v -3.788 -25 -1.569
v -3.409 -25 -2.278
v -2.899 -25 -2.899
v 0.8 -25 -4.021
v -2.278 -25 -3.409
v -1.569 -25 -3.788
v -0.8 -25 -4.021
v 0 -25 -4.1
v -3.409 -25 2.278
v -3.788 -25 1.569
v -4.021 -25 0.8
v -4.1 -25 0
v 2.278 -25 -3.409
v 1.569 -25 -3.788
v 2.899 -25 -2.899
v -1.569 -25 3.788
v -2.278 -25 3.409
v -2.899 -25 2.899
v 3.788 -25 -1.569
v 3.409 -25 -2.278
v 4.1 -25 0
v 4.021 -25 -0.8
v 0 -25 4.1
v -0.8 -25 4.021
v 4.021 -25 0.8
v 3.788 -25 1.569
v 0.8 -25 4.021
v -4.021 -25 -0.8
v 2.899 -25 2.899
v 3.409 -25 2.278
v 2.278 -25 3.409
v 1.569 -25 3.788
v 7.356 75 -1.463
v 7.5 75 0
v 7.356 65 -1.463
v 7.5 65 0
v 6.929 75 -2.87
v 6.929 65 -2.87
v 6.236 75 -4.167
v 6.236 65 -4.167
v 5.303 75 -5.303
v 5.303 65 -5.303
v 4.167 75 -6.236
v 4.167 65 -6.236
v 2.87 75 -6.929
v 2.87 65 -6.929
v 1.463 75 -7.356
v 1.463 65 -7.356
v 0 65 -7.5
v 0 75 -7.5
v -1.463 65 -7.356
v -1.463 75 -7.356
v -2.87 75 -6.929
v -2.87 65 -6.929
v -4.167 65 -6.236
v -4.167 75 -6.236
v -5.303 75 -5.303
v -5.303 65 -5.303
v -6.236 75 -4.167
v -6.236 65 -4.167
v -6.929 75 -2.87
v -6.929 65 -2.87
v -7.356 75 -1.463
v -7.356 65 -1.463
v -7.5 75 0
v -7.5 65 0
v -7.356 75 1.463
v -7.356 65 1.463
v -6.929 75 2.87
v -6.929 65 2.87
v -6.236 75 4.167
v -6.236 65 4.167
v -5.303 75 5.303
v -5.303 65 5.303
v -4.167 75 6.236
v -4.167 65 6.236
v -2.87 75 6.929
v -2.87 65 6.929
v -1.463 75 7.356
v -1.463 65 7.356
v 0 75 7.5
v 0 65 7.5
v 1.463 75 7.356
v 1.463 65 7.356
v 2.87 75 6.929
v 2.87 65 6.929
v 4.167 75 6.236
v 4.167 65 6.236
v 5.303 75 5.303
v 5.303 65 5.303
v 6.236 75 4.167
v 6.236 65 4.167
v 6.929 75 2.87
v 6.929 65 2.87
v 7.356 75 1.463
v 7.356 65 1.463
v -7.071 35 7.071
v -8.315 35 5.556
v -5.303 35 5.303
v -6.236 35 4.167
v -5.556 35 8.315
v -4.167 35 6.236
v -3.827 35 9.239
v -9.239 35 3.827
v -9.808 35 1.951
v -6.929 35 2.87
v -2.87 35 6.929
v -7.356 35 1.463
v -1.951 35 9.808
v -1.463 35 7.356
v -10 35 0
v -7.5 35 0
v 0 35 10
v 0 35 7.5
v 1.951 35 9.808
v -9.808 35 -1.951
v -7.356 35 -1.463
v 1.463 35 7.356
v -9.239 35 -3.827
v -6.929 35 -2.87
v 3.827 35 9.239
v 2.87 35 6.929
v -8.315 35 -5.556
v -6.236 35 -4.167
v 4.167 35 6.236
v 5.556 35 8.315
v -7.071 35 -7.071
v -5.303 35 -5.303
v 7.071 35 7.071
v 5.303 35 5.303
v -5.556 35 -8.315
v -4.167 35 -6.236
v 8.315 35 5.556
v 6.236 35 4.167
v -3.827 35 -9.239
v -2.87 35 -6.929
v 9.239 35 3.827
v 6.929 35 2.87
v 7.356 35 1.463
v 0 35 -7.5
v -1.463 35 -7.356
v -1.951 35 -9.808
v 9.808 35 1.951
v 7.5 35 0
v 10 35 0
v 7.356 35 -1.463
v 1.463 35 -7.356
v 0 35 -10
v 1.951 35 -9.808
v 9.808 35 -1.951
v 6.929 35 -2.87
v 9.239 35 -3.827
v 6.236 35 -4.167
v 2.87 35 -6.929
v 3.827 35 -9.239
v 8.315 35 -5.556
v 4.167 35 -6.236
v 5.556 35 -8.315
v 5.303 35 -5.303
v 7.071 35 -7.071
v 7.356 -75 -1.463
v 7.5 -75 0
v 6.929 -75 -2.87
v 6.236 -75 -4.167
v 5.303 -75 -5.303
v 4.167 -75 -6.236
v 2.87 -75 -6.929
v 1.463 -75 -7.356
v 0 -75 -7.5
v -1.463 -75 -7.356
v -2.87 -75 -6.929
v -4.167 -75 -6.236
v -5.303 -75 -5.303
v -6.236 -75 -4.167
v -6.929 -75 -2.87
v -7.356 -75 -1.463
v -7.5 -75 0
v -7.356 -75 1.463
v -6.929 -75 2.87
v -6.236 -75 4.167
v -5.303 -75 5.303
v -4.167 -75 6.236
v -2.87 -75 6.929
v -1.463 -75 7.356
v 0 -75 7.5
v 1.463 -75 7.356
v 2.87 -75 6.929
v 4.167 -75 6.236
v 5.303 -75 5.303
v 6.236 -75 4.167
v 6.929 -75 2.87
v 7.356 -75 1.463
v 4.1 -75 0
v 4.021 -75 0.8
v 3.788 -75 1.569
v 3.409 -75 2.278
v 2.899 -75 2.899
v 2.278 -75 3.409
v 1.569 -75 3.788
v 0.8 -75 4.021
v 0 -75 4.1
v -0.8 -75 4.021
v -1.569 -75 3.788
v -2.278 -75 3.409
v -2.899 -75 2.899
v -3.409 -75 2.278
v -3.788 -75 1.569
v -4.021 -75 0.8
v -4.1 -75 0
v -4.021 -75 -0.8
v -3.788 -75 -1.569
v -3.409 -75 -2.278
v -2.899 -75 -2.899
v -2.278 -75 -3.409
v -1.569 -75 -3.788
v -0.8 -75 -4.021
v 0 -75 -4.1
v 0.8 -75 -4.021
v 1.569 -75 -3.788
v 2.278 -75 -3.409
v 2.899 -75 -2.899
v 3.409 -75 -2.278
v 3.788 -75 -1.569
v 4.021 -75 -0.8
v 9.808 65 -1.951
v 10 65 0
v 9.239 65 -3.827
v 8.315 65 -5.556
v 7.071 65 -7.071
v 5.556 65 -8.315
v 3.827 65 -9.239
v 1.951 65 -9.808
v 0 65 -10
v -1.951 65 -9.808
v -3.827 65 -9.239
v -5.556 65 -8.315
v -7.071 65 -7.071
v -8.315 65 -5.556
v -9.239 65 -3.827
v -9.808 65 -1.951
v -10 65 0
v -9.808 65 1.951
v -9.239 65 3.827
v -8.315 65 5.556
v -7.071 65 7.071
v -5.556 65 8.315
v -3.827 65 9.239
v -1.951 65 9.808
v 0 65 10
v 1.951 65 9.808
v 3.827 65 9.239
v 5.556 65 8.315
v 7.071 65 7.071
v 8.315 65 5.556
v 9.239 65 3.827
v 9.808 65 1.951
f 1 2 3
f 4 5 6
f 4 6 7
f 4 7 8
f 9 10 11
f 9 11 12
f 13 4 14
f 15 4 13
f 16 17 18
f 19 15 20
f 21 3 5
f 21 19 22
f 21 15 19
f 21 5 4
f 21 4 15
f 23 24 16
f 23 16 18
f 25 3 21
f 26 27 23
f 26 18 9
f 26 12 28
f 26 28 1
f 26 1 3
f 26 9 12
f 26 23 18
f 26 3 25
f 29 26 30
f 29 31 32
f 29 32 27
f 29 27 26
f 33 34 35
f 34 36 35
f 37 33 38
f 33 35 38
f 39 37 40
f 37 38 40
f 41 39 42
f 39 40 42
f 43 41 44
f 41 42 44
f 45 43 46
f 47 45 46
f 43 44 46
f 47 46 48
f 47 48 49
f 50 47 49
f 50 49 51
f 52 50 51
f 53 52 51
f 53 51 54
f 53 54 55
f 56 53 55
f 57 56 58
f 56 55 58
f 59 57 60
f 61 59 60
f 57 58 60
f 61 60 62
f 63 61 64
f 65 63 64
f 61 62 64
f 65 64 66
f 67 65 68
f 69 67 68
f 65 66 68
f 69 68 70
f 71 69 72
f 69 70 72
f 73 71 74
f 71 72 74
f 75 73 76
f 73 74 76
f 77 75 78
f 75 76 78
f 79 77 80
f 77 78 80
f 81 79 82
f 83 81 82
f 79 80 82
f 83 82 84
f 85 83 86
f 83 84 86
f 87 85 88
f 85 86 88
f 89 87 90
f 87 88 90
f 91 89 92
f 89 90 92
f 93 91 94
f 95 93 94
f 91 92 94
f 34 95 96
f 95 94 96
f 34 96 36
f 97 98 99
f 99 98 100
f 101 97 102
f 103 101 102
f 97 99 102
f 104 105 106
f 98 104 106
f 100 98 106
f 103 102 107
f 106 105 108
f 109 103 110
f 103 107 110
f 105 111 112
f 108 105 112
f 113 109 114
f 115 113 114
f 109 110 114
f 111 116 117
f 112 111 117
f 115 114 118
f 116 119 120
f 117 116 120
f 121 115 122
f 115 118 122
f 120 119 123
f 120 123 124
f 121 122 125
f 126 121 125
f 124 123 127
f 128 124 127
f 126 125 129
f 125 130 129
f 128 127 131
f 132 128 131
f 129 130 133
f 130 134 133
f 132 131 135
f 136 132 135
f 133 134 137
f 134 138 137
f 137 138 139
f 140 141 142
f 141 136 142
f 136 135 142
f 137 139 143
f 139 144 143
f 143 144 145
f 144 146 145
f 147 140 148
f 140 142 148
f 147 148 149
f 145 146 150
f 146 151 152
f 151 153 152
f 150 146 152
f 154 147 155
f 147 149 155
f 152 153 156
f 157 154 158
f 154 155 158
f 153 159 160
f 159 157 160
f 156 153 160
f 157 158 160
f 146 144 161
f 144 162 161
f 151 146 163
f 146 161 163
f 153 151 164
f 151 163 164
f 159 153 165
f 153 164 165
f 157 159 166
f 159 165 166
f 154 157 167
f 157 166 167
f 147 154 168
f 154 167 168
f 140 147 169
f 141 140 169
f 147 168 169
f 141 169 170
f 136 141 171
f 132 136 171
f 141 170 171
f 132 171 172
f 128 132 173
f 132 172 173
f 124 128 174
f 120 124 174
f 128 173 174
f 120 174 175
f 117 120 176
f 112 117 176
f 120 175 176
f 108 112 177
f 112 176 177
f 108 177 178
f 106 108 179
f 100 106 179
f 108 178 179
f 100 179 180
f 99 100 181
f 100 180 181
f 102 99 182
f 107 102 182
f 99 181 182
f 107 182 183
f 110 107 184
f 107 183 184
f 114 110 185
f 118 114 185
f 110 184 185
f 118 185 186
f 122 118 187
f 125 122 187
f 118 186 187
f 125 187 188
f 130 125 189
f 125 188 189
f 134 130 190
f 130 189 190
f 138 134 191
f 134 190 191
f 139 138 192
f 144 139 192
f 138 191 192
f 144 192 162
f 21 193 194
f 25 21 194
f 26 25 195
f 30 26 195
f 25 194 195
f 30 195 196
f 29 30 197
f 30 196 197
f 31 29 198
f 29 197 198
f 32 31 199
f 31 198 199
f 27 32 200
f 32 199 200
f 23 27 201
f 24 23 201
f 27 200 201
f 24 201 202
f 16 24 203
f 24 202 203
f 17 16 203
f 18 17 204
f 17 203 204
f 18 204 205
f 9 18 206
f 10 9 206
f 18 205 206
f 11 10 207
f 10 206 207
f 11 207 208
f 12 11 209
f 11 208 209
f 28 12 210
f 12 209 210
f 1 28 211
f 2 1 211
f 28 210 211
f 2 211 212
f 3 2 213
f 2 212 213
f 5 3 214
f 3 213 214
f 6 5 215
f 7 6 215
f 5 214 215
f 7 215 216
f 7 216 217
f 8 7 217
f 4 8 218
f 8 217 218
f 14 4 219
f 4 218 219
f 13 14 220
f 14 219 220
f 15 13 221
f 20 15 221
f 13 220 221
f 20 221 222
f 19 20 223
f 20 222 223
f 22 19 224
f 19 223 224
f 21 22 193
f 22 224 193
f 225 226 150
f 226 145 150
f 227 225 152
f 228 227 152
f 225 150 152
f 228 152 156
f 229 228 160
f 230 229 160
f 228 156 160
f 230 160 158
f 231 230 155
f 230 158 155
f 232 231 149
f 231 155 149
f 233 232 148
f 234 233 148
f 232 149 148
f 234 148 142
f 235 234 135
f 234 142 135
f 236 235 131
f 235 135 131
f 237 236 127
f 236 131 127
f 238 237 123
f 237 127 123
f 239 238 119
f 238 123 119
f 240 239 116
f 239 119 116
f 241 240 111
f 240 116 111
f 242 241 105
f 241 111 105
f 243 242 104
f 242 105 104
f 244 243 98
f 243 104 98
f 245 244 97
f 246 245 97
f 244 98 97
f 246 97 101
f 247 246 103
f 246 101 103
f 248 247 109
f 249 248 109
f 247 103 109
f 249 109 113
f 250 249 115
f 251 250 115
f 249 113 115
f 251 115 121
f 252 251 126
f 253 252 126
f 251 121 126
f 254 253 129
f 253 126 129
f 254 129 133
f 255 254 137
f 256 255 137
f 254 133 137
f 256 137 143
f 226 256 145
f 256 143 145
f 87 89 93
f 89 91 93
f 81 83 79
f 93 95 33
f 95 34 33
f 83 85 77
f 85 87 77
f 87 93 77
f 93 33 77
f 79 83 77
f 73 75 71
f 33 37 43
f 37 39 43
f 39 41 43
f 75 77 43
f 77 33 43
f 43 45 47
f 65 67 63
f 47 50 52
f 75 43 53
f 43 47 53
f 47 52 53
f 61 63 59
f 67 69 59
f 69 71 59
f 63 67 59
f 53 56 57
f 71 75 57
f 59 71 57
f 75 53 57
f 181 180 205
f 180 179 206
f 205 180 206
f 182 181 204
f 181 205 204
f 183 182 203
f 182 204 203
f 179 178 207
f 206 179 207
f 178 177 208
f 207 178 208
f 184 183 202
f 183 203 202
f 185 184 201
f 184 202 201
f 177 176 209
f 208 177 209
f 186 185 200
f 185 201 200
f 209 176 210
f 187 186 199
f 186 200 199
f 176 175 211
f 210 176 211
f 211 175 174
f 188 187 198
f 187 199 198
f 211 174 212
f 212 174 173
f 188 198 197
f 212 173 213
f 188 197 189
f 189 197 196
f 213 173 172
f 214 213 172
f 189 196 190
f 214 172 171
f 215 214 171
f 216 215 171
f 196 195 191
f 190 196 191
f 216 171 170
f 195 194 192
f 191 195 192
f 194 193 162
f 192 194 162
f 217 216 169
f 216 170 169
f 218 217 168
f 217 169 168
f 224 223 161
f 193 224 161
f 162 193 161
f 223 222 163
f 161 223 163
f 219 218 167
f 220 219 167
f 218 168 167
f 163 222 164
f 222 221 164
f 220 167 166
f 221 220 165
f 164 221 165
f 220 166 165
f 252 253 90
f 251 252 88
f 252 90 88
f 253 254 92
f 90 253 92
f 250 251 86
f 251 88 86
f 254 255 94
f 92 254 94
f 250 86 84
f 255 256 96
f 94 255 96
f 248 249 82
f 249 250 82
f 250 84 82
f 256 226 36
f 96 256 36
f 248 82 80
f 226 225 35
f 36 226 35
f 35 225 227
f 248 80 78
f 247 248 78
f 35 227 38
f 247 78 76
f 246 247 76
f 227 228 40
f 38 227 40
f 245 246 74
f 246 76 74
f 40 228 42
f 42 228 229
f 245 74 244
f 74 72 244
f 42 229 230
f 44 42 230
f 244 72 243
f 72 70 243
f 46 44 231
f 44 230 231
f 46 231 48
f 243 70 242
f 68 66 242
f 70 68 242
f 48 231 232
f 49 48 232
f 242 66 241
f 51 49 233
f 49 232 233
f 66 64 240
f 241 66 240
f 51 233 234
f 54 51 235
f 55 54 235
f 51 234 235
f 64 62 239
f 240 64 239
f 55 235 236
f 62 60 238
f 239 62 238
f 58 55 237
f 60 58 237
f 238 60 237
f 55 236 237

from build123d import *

# Parameters (mm, degrees)
SKETCH2_R          = 4.1
CUT_EXTRUDE1_DEPTH = 50


with BuildPart() as part:
    # Sketch1 → Revolve1 (revolve)
    with BuildSketch(Plane.XY, mode=Mode.PRIVATE) as revolve1_sk:
        Polygon((0, -75), (0, 75), (-7.5, 75), (-7.5, 65), (-10, 65), (-10, 35), (-7.5, 35), (-7.5, -75), align=None)
    revolve(revolve1_sk.sketch.rotate(Axis((0, -75, 0), (0, 1, 0)), 180), axis=Axis((0, -75, 0), (0, 1, 0)))

    # Sketch2 → Cut-Extrude1 (cut)
    with BuildSketch(Plane.XZ.offset(75)):
        Circle(SKETCH2_R)
    extrude(amount=-CUT_EXTRUDE1_DEPTH, mode=Mode.SUBTRACT)


solid = part.part
